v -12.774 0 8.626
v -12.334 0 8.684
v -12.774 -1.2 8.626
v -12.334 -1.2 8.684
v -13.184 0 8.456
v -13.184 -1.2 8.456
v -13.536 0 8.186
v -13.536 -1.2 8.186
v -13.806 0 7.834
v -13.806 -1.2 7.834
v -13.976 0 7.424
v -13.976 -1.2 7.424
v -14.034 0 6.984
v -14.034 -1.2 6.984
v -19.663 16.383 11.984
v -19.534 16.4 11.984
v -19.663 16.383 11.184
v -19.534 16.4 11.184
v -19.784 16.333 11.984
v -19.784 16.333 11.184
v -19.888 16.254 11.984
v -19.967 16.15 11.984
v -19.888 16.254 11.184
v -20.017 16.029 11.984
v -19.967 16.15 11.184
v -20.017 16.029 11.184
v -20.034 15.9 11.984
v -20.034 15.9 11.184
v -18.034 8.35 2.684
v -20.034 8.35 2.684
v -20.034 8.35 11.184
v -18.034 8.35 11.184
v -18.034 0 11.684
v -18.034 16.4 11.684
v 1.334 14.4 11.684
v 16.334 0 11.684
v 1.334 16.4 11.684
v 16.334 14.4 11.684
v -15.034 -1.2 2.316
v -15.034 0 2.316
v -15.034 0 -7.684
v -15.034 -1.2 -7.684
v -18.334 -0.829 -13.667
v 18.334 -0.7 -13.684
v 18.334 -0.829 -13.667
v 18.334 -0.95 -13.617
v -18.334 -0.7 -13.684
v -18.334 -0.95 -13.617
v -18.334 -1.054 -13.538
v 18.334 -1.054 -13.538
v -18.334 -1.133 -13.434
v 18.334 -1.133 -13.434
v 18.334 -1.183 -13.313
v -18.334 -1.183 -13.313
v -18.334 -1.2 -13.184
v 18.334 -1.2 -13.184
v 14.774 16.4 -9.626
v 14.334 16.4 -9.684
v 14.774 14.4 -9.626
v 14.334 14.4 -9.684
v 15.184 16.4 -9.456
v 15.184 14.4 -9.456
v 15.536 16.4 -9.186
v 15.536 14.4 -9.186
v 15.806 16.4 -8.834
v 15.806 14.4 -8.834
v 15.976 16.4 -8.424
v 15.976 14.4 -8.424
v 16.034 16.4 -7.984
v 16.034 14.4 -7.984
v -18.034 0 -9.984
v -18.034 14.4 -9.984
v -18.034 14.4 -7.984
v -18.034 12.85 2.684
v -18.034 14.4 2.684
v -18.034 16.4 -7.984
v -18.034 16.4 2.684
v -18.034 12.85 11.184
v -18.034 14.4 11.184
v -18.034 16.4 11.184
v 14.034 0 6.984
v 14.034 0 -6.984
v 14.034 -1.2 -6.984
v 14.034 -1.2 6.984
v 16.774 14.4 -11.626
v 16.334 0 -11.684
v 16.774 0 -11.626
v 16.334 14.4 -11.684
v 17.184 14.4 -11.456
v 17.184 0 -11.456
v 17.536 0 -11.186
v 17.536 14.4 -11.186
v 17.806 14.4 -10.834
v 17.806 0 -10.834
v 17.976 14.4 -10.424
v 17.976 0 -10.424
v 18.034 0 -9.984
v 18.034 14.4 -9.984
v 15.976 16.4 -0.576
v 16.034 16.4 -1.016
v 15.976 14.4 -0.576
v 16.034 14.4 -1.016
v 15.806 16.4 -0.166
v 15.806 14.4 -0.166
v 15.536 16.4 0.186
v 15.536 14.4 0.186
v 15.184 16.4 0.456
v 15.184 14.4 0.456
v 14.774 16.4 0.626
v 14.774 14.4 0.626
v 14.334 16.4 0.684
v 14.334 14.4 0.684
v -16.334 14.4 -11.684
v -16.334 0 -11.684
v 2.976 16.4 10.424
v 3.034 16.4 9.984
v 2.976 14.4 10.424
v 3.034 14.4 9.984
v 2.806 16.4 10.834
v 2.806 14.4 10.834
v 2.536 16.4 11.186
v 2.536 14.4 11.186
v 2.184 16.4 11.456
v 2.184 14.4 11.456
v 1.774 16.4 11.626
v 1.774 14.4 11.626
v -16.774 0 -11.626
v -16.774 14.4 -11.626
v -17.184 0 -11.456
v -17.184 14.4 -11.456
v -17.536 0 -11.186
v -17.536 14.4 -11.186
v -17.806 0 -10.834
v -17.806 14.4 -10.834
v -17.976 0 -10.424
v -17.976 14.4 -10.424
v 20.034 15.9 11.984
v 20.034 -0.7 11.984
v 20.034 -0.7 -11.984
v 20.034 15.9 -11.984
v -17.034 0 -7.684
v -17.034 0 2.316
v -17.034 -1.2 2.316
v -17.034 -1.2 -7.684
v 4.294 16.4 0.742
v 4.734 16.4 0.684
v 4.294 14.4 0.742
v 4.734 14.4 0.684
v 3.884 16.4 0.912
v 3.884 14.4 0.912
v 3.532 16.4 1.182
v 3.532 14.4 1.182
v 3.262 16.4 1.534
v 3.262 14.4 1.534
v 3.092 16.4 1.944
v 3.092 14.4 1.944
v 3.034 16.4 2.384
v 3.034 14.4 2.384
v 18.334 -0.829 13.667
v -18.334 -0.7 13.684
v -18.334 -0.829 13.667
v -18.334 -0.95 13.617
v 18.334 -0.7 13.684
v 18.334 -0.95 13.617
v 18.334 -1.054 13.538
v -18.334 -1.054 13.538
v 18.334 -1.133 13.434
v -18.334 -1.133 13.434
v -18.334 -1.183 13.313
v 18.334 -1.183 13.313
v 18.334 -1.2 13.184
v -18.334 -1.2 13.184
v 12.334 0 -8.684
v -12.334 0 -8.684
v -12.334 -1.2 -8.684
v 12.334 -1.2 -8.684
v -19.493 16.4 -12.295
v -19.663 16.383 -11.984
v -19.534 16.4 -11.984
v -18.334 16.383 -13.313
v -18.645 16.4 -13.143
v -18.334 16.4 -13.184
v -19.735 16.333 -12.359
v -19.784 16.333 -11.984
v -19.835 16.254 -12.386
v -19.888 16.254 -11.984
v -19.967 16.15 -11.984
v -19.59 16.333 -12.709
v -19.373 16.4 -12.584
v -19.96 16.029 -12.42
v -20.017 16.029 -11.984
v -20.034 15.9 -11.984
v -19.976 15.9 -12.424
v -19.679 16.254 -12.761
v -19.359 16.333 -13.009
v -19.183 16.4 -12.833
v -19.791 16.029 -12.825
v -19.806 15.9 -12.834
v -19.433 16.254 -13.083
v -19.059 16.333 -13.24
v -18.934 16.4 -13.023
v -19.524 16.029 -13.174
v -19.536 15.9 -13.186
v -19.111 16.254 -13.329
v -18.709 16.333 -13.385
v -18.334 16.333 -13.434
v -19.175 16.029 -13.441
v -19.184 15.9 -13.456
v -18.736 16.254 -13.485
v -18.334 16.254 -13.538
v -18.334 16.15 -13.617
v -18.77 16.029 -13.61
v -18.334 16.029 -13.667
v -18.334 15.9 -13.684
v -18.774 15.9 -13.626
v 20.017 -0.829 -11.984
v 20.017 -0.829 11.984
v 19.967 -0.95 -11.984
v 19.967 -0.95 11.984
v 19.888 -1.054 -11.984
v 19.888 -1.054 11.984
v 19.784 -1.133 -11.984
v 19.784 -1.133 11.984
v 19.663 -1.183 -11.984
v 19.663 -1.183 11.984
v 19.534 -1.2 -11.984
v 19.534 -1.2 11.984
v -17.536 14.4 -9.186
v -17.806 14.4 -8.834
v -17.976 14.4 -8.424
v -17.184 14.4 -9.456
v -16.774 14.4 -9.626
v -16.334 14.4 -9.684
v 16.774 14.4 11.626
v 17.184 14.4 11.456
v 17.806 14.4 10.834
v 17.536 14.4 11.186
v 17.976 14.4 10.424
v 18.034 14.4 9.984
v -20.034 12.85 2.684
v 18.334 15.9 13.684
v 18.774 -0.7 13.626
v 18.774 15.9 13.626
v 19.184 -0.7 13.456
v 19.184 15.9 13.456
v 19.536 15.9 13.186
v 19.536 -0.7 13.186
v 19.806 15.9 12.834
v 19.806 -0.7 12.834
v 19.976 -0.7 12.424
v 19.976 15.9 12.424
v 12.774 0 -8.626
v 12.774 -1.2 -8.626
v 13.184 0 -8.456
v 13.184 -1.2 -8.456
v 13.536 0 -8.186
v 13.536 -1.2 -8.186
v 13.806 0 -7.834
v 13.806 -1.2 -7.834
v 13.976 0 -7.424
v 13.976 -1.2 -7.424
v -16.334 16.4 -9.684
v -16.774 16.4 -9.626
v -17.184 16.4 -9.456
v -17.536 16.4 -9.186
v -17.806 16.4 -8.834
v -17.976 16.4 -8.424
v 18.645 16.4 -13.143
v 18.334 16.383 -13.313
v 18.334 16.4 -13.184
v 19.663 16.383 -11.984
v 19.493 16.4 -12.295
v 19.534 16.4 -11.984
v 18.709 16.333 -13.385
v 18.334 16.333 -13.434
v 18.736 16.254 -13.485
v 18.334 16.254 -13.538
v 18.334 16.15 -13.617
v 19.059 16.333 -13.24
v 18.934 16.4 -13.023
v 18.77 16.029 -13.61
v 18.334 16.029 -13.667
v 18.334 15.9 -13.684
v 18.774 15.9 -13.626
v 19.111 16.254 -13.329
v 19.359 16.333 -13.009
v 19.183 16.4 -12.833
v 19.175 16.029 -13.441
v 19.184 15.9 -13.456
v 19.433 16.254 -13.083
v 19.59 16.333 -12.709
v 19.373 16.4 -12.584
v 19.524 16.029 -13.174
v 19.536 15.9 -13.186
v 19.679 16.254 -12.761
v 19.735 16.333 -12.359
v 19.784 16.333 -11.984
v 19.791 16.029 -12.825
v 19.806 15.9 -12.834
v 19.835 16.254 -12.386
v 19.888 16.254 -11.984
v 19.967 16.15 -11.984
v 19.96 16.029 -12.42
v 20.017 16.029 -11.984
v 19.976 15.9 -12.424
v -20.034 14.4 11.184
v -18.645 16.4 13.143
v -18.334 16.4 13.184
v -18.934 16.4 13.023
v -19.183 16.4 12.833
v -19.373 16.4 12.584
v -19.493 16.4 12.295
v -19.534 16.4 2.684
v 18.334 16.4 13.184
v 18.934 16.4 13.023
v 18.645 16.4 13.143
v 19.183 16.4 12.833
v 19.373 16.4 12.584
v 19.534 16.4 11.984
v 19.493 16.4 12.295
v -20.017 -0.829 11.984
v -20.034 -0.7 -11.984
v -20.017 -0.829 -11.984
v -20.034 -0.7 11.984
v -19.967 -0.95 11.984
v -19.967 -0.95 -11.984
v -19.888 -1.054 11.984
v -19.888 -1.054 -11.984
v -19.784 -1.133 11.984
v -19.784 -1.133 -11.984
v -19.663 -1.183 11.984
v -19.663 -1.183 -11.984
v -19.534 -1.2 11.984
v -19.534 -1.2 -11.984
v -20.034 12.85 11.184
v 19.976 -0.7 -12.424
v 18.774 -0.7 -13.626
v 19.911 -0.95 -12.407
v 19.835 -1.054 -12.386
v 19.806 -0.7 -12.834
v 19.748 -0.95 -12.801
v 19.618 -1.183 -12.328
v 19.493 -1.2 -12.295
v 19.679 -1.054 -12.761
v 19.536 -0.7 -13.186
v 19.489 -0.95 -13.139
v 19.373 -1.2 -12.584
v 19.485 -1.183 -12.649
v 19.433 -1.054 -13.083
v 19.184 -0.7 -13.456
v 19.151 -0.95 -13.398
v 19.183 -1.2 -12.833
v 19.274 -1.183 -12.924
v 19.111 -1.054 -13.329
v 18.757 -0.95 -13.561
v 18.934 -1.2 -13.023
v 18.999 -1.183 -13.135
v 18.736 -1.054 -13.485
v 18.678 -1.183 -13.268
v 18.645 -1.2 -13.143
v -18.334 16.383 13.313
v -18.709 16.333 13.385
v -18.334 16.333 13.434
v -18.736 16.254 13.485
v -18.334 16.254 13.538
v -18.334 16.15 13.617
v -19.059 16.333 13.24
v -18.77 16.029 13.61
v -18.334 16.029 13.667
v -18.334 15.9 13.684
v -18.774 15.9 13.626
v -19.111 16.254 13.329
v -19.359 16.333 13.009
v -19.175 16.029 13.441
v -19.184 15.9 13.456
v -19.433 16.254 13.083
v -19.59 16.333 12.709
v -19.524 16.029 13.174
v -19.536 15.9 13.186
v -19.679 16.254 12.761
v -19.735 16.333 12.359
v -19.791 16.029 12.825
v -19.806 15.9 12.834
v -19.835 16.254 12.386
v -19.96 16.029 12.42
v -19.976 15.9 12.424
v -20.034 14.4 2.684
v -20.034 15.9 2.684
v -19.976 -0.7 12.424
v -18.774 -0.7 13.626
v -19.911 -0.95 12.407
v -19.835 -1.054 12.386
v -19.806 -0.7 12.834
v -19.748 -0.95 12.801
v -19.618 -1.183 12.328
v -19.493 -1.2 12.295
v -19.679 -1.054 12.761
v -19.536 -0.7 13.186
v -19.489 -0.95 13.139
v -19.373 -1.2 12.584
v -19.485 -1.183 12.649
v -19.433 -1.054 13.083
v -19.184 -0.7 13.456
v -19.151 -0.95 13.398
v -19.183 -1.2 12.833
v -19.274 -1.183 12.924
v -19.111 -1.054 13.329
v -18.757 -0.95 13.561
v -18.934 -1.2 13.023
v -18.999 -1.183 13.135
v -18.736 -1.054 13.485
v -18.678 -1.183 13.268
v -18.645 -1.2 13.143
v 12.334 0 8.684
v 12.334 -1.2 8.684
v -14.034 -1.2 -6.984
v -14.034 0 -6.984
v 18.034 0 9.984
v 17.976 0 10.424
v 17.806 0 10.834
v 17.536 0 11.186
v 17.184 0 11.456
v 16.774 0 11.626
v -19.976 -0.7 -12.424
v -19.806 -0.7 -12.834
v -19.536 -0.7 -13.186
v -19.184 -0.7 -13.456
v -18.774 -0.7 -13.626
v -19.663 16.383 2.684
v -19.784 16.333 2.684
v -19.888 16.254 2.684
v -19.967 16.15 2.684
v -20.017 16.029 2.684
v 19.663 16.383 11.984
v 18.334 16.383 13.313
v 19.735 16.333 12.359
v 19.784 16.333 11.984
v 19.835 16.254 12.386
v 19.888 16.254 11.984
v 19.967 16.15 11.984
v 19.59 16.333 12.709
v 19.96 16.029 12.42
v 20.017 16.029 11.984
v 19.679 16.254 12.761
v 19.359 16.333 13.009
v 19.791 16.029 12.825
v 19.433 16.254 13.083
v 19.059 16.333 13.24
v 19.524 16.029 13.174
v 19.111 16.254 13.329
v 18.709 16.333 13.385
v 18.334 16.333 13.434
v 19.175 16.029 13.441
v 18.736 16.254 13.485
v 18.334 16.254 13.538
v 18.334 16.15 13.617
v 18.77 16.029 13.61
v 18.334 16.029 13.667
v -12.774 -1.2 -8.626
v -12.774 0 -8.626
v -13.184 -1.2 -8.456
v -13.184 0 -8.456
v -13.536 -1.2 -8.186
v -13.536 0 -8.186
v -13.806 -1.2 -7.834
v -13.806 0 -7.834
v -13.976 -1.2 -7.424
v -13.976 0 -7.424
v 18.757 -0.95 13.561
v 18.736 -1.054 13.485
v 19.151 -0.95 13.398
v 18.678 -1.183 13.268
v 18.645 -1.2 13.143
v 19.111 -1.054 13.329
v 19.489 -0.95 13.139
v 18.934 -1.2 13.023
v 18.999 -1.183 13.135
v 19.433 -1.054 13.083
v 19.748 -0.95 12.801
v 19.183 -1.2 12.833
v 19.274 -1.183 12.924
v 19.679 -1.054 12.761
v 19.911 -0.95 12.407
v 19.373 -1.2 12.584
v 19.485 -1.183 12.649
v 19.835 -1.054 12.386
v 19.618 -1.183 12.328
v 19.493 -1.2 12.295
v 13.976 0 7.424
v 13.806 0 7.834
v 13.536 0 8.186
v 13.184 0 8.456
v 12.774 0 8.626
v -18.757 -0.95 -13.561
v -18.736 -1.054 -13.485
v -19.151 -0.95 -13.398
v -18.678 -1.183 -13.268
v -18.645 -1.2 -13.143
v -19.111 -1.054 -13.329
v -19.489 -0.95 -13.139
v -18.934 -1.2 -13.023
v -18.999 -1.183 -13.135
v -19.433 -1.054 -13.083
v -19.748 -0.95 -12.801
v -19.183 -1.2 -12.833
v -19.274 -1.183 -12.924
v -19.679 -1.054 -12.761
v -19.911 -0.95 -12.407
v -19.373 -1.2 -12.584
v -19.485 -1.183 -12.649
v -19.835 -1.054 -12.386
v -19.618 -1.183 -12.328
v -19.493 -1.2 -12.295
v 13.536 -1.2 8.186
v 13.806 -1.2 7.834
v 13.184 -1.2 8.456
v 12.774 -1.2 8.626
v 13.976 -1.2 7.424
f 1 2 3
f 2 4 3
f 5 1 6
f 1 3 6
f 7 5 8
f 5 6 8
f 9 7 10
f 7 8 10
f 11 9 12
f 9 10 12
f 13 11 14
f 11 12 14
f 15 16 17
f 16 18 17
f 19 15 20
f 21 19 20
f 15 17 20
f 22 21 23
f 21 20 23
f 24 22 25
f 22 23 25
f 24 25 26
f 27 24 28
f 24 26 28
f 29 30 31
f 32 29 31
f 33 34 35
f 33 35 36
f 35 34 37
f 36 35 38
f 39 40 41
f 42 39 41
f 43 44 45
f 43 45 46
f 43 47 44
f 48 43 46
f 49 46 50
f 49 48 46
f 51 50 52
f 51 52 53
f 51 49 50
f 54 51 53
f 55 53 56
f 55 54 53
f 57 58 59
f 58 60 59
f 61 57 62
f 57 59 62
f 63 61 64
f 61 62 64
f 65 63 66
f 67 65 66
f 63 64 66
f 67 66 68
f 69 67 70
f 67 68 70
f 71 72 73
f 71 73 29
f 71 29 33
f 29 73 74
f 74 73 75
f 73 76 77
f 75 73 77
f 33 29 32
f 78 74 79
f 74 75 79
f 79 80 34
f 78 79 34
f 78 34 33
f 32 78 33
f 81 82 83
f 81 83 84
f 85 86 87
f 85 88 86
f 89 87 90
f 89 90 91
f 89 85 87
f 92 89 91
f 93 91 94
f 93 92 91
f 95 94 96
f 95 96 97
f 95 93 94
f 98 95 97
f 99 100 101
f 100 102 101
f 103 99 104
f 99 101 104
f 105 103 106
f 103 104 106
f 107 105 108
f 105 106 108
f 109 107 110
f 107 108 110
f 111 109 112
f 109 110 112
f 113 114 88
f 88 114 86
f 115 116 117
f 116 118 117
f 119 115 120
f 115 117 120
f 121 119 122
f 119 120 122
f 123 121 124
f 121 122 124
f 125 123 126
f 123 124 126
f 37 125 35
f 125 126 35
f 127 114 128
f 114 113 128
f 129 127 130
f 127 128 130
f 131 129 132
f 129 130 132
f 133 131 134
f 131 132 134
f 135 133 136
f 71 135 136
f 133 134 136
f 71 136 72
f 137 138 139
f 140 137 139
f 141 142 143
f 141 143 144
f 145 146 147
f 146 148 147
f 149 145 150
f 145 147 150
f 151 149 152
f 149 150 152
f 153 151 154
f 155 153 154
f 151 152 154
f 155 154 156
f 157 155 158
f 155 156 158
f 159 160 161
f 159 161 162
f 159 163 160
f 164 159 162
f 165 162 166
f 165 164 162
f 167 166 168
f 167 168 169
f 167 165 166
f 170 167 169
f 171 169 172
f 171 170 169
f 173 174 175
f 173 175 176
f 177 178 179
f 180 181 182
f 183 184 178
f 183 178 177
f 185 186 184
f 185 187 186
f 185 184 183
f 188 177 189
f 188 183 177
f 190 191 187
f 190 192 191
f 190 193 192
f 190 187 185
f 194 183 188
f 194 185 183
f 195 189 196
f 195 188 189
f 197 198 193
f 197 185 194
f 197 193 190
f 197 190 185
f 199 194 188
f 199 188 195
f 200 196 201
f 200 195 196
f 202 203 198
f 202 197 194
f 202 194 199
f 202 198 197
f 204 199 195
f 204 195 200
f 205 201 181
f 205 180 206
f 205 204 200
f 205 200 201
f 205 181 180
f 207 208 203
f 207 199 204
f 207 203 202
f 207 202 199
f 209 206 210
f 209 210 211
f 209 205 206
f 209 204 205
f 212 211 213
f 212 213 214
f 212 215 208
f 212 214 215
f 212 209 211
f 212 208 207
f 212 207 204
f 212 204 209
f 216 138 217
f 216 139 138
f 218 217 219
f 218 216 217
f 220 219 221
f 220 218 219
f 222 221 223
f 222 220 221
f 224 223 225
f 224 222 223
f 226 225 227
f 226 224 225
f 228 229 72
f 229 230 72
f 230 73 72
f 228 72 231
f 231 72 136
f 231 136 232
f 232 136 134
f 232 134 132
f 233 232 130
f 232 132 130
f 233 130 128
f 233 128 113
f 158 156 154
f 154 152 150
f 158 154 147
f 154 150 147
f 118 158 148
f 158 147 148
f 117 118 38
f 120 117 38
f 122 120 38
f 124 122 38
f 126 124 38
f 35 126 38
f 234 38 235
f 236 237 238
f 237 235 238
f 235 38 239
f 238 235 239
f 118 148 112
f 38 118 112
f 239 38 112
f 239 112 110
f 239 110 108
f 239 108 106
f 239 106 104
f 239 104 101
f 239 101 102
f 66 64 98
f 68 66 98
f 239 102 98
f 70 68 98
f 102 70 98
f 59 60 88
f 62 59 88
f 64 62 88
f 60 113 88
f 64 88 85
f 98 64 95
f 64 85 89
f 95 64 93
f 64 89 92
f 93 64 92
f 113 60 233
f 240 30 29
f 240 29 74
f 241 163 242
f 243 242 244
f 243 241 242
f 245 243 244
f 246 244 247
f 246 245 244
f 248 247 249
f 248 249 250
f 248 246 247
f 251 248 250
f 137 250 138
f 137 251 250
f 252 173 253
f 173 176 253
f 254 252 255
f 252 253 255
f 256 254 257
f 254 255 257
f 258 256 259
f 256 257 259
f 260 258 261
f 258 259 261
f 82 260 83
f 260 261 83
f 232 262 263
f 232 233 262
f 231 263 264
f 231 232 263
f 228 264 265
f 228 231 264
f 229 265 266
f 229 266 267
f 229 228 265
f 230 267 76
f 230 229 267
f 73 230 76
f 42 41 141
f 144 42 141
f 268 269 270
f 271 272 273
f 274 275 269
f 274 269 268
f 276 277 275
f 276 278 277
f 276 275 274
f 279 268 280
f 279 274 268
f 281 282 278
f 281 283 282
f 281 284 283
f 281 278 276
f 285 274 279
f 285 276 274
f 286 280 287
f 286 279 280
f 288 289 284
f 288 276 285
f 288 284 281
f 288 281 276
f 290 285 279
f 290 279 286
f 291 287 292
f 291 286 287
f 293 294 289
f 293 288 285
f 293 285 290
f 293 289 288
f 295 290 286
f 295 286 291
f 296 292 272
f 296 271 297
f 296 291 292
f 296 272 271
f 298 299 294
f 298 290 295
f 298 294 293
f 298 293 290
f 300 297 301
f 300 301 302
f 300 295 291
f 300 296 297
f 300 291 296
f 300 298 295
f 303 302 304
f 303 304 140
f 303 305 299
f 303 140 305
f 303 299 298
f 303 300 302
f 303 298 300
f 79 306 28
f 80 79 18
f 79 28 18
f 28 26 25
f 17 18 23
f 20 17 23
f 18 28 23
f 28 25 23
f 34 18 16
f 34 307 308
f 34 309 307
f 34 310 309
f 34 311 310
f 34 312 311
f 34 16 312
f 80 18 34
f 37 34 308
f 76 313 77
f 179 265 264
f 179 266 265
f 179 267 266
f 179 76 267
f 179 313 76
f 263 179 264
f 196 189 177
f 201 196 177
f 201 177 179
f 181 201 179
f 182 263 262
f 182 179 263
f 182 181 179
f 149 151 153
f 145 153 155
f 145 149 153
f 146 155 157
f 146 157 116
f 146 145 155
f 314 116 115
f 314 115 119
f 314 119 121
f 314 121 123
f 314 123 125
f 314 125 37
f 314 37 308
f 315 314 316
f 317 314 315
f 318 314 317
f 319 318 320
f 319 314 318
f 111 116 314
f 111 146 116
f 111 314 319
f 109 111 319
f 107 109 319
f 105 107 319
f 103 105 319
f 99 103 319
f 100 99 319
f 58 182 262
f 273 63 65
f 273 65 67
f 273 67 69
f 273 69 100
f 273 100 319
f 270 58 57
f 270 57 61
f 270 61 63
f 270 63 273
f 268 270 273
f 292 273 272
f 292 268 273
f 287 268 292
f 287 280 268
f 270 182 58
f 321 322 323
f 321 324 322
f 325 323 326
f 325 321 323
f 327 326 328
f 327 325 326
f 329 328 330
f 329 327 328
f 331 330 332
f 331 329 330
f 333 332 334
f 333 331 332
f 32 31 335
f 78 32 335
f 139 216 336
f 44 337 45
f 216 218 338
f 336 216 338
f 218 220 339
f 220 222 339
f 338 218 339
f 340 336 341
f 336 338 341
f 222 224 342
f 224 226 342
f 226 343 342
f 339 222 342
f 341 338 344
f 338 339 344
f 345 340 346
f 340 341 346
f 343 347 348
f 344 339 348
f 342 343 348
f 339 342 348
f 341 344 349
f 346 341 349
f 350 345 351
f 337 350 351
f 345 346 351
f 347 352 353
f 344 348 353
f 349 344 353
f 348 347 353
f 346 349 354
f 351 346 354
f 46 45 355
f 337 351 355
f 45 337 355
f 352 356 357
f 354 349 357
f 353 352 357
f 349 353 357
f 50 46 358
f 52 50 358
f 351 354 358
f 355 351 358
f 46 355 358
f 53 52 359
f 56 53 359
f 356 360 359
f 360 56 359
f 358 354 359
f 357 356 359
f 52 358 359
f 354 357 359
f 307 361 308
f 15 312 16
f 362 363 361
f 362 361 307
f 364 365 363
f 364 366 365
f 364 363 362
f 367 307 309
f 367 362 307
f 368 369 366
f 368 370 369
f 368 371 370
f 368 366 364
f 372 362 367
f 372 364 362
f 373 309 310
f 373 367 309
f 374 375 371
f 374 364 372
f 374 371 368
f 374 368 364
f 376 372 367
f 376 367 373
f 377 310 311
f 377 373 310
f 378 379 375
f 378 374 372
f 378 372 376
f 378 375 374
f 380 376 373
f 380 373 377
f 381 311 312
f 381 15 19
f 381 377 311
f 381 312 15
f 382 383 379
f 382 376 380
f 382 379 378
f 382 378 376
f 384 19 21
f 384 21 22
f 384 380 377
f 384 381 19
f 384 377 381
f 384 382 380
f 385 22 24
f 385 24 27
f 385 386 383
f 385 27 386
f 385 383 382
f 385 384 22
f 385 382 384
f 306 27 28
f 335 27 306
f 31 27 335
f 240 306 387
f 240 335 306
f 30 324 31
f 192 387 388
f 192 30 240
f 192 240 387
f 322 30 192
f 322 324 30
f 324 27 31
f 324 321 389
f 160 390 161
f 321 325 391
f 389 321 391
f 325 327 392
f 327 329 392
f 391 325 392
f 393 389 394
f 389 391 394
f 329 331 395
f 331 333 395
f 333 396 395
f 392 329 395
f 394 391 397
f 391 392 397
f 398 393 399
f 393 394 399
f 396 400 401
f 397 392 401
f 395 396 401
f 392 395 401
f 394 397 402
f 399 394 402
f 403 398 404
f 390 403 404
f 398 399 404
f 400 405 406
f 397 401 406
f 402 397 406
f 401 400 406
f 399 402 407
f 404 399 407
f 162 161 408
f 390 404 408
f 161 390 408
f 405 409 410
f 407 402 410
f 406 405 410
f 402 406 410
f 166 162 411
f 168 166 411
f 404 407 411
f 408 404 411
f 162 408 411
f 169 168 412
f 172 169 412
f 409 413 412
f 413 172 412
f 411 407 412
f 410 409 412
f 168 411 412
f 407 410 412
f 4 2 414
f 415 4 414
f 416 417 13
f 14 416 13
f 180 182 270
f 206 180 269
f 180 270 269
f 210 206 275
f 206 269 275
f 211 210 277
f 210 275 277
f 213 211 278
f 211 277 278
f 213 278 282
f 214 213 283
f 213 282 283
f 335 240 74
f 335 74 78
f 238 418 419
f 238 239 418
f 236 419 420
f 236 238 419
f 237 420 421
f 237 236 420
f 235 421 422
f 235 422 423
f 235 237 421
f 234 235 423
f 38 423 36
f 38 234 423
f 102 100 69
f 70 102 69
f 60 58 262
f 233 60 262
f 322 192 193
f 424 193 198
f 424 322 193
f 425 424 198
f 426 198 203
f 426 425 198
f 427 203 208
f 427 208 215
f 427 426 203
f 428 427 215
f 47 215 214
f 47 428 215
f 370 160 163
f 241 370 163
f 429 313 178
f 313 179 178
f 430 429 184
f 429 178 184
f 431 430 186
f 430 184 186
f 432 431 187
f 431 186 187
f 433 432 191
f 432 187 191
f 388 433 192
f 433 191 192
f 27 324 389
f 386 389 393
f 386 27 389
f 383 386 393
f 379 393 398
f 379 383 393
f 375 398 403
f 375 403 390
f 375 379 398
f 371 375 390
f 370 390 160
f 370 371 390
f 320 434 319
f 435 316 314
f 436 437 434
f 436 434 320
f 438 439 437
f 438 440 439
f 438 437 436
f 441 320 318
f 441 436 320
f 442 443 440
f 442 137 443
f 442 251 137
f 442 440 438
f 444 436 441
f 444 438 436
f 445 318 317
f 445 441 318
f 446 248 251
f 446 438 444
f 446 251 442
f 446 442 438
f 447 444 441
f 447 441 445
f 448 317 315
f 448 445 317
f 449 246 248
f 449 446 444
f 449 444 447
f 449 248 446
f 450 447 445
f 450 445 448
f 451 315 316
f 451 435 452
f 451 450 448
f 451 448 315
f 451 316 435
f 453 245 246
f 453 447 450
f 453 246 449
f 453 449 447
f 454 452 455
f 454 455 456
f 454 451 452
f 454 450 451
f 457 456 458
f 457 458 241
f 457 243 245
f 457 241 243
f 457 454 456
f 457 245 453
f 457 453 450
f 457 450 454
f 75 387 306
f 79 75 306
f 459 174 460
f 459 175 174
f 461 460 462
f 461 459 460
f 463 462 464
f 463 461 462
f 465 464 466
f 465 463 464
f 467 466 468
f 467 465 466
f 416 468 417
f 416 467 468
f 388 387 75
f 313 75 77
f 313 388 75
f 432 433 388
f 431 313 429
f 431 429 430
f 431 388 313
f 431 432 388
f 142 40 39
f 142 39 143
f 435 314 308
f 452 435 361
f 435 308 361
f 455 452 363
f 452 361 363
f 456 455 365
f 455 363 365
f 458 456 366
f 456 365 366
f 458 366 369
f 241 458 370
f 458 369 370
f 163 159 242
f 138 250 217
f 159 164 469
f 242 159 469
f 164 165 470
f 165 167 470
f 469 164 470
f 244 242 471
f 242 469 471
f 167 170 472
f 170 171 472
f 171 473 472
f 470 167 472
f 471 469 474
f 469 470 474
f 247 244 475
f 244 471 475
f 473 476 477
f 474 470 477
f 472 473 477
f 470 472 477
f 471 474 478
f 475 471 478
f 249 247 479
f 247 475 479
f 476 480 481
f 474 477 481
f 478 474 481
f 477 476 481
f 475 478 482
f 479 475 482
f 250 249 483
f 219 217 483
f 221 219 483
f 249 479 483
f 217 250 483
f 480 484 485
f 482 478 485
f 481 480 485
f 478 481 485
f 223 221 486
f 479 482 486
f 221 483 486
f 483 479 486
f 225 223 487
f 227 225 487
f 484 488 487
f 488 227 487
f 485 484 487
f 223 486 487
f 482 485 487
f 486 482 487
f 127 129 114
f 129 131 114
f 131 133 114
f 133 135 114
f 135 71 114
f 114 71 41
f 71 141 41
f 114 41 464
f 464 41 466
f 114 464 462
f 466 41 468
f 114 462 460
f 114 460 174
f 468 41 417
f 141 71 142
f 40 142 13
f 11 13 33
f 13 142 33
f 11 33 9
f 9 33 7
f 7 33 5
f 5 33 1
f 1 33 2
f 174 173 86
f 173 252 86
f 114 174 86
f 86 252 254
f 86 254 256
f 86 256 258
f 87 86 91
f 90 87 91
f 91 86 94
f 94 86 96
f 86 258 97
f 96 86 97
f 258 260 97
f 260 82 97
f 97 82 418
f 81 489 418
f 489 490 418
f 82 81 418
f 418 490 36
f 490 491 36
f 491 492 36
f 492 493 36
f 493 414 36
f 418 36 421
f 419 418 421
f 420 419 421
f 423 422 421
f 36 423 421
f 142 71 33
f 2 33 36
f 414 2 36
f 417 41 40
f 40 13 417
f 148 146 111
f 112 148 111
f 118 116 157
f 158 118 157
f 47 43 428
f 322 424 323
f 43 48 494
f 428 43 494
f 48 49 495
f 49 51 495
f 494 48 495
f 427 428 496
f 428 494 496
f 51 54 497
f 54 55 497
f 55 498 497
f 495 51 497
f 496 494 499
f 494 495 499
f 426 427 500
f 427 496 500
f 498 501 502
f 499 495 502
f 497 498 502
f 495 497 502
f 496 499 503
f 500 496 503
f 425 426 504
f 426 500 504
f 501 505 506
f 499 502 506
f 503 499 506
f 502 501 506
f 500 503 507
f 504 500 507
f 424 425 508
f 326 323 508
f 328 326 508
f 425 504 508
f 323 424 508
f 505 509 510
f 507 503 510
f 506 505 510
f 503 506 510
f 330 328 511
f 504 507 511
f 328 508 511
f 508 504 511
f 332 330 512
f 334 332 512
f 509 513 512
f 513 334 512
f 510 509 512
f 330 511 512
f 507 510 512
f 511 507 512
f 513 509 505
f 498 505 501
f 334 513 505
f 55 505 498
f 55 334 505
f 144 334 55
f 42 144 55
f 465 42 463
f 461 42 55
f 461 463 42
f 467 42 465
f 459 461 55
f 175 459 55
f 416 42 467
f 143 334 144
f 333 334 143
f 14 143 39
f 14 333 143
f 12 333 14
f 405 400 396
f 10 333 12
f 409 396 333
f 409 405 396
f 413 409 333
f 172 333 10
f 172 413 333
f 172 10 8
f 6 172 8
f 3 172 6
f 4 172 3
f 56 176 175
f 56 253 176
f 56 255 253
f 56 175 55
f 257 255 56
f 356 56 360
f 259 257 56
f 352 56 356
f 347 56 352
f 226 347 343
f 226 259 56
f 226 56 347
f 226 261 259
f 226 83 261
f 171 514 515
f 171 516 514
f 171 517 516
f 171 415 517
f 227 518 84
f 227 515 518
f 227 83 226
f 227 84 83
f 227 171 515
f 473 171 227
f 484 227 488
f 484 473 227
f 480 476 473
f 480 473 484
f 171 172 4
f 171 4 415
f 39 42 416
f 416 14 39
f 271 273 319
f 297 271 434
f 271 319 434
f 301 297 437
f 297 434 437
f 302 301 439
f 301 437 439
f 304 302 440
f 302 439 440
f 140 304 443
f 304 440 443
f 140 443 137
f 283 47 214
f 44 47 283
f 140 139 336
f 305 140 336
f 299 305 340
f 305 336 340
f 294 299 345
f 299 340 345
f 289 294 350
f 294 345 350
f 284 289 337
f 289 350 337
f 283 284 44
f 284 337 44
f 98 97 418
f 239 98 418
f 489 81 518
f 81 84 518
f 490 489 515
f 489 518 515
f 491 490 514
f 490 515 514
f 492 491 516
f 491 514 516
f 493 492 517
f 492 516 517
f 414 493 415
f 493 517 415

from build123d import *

# Parameters (mm, degrees)
BOSS_EXTRUDE2_DEPTH = 14.4
SKETCH3_W           = 40.068
SKETCH3_H           = 27.368
SKETCH3_W_2         = 28.068
SKETCH3_H_2         = 17.368
BOSS_EXTRUDE3_DEPTH = 1.2
BOSS_EXTRUDE4_START = 14.4
SKETCH1_4_W         = 40.068
SKETCH1_4_H         = 27.368
BOSS_EXTRUDE4_DEPTH = 2
FILLET1_R           = 1.7
FILLET2_R           = 1.7
SKETCH4_W           = 8.5
SKETCH4_H           = 4.5
CUT_EXTRUDE1_DEPTH  = 2
SKETCH5_W           = 2
SKETCH5_H           = 10
CUT_EXTRUDE2_DEPTH  = 1.2
CUT_EXTRUDE3_DEPTH  = 2
FILLET4_R           = 1.7
SKETCH7_W           = 8.5
SKETCH7_H           = 2
CUT_EXTRUDE4_DEPTH  = 2
FILLET5_R           = 0.5


with BuildPart() as part:
    # Sketch1 → Boss-Extrude2 (new body)
    with BuildSketch(Plane(origin=(0, 0, 0), x_dir=(1, 0, 0), z_dir=(0, 1, 0))):
        Polygon((-20.034, 0), (-18.034, 0), (-18.034, 11.684), (0, 11.684), (0, 13.684), (-20.034, 13.684), align=None)
        Polygon((18.034, 11.684), (18.034, 0), (20.034, 0), (20.034, 13.684), (0, 13.684), (0, 11.684), align=None)
        Polygon((18.034, 0), (18.034, -11.684), (0, -11.684), (0, -13.684), (20.034, -13.684), (20.034, 0), align=None)
        Polygon((0, -13.684), (0, -11.684), (-18.034, -11.684), (-18.034, 0), (-20.034, 0), (-20.034, -13.684), align=None)
    extrude(amount=BOSS_EXTRUDE2_DEPTH)

    # Sketch3 → Boss-Extrude3 (add)
    with BuildSketch(Plane.XZ):
        Rectangle(SKETCH3_W, SKETCH3_H)
        Rectangle(SKETCH3_W_2, SKETCH3_H_2, mode=Mode.SUBTRACT)
    extrude(amount=BOSS_EXTRUDE3_DEPTH)

    # Sketch1<4> → Boss-Extrude4 (add)
    with BuildSketch(Plane(origin=(0, 0, 0), x_dir=(1, 0, 0), z_dir=(0, 1, 0)).offset(BOSS_EXTRUDE4_START)):
        Rectangle(SKETCH1_4_W, SKETCH1_4_H)
    extrude(amount=BOSS_EXTRUDE4_DEPTH)

    # Fillet1
    fillet1_edges = [part.edges().sort_by_distance(p)[0] for p in [
        (18.034, 7.2, -11.684),
        (-18.034, 7.2, -11.684),
        (18.034, 7.2, 11.684),
        (-20.034, 7.6, 13.684),
        (-20.034, 7.6, -13.684),
        (20.034, 7.6, -13.684),
        (20.034, 7.6, 13.684),
    ]]
    fillet(fillet1_edges, radius=FILLET1_R)

    # Fillet2
    fillet2_edges = [part.edges().sort_by_distance(p)[0] for p in [
        (14.034, -0.6, -8.684),
        (-14.034, -0.6, -8.684),
        (-14.034, -0.6, 8.684),
        (14.034, -0.6, 8.684),
    ]]
    fillet(fillet2_edges, radius=FILLET2_R)

    # Sketch4 → Cut-Extrude1 (cut)
    with BuildSketch(Plane.ZY.offset(20.034)):
        with Locations((6.934, 10.6)):
            Rectangle(SKETCH4_W, SKETCH4_H)
    extrude(amount=-CUT_EXTRUDE1_DEPTH, mode=Mode.SUBTRACT)

    # Sketch5 → Cut-Extrude2 (cut)
    with BuildSketch(Plane(origin=(0, 0, 0), x_dir=(-1, 0, 0), z_dir=(0, -1, 0))):
        with Locations((16.034, 2.684)):
            Rectangle(SKETCH5_W, SKETCH5_H)
    extrude(amount=CUT_EXTRUDE2_DEPTH, mode=Mode.SUBTRACT)

    # Sketch6 → Cut-Extrude3 (cut)
    with BuildSketch(Plane(origin=(0, 16.4, 0), x_dir=(1, 0, 0), z_dir=(0, 1, 0))):
        Polygon((-18.034, -11.684), (3.034, -11.684), (3.034, -0.684), (16.034, -0.684), (16.034, 9.684), (-18.034, 9.684), align=None)
    extrude(amount=-CUT_EXTRUDE3_DEPTH, mode=Mode.SUBTRACT)

    # Fillet4
    fillet4_edges = [part.edges().sort_by_distance(p)[0] for p in [
        (-18.034, 15.4, -9.684),
        (16.034, 15.4, -9.684),
        (16.034, 15.4, 0.684),
        (3.034, 15.4, 0.684),
        (3.034, 15.4, 11.684),
    ]]
    fillet(fillet4_edges, radius=FILLET4_R)

    # Sketch7 → Cut-Extrude4 (cut)
    with BuildSketch(Plane.ZY.offset(20.034)):
        with Locations((6.934, 15.4)):
            Rectangle(SKETCH7_W, SKETCH7_H)
    extrude(amount=-CUT_EXTRUDE4_DEPTH, mode=Mode.SUBTRACT)

    # Fillet5
    fillet5_edges = [part.edges().sort_by_distance(p)[0] for p in [
        (-20.034, 16.4, 11.584),
        (0, -1.2, 13.684),
        (0, 16.4, 13.684),
        (20.034, -1.2, 0),
        (-20.034, -1.2, 0),
        (0, -1.2, -13.684),
        (-19.536081528, -1.2, -13.186081528),
        (19.536081528, -1.2, -13.186081528),
        (19.536081528, -1.2, 13.186081528),
        (-19.536081528, -1.2, 13.186081528),
        (-20.034, 16.4, -4.65),
        (20.034, 16.4, 0),
        (0, 16.4, -13.684),
        (-19.536081528, 16.4, -13.186081528),
        (19.536081528, 16.4, -13.186081528),
        (19.536081528, 16.4, 13.186081528),
        (-19.536081528, 16.4, 13.186081528),
    ]]
    fillet(fillet5_edges, radius=FILLET5_R)


solid = part.part
